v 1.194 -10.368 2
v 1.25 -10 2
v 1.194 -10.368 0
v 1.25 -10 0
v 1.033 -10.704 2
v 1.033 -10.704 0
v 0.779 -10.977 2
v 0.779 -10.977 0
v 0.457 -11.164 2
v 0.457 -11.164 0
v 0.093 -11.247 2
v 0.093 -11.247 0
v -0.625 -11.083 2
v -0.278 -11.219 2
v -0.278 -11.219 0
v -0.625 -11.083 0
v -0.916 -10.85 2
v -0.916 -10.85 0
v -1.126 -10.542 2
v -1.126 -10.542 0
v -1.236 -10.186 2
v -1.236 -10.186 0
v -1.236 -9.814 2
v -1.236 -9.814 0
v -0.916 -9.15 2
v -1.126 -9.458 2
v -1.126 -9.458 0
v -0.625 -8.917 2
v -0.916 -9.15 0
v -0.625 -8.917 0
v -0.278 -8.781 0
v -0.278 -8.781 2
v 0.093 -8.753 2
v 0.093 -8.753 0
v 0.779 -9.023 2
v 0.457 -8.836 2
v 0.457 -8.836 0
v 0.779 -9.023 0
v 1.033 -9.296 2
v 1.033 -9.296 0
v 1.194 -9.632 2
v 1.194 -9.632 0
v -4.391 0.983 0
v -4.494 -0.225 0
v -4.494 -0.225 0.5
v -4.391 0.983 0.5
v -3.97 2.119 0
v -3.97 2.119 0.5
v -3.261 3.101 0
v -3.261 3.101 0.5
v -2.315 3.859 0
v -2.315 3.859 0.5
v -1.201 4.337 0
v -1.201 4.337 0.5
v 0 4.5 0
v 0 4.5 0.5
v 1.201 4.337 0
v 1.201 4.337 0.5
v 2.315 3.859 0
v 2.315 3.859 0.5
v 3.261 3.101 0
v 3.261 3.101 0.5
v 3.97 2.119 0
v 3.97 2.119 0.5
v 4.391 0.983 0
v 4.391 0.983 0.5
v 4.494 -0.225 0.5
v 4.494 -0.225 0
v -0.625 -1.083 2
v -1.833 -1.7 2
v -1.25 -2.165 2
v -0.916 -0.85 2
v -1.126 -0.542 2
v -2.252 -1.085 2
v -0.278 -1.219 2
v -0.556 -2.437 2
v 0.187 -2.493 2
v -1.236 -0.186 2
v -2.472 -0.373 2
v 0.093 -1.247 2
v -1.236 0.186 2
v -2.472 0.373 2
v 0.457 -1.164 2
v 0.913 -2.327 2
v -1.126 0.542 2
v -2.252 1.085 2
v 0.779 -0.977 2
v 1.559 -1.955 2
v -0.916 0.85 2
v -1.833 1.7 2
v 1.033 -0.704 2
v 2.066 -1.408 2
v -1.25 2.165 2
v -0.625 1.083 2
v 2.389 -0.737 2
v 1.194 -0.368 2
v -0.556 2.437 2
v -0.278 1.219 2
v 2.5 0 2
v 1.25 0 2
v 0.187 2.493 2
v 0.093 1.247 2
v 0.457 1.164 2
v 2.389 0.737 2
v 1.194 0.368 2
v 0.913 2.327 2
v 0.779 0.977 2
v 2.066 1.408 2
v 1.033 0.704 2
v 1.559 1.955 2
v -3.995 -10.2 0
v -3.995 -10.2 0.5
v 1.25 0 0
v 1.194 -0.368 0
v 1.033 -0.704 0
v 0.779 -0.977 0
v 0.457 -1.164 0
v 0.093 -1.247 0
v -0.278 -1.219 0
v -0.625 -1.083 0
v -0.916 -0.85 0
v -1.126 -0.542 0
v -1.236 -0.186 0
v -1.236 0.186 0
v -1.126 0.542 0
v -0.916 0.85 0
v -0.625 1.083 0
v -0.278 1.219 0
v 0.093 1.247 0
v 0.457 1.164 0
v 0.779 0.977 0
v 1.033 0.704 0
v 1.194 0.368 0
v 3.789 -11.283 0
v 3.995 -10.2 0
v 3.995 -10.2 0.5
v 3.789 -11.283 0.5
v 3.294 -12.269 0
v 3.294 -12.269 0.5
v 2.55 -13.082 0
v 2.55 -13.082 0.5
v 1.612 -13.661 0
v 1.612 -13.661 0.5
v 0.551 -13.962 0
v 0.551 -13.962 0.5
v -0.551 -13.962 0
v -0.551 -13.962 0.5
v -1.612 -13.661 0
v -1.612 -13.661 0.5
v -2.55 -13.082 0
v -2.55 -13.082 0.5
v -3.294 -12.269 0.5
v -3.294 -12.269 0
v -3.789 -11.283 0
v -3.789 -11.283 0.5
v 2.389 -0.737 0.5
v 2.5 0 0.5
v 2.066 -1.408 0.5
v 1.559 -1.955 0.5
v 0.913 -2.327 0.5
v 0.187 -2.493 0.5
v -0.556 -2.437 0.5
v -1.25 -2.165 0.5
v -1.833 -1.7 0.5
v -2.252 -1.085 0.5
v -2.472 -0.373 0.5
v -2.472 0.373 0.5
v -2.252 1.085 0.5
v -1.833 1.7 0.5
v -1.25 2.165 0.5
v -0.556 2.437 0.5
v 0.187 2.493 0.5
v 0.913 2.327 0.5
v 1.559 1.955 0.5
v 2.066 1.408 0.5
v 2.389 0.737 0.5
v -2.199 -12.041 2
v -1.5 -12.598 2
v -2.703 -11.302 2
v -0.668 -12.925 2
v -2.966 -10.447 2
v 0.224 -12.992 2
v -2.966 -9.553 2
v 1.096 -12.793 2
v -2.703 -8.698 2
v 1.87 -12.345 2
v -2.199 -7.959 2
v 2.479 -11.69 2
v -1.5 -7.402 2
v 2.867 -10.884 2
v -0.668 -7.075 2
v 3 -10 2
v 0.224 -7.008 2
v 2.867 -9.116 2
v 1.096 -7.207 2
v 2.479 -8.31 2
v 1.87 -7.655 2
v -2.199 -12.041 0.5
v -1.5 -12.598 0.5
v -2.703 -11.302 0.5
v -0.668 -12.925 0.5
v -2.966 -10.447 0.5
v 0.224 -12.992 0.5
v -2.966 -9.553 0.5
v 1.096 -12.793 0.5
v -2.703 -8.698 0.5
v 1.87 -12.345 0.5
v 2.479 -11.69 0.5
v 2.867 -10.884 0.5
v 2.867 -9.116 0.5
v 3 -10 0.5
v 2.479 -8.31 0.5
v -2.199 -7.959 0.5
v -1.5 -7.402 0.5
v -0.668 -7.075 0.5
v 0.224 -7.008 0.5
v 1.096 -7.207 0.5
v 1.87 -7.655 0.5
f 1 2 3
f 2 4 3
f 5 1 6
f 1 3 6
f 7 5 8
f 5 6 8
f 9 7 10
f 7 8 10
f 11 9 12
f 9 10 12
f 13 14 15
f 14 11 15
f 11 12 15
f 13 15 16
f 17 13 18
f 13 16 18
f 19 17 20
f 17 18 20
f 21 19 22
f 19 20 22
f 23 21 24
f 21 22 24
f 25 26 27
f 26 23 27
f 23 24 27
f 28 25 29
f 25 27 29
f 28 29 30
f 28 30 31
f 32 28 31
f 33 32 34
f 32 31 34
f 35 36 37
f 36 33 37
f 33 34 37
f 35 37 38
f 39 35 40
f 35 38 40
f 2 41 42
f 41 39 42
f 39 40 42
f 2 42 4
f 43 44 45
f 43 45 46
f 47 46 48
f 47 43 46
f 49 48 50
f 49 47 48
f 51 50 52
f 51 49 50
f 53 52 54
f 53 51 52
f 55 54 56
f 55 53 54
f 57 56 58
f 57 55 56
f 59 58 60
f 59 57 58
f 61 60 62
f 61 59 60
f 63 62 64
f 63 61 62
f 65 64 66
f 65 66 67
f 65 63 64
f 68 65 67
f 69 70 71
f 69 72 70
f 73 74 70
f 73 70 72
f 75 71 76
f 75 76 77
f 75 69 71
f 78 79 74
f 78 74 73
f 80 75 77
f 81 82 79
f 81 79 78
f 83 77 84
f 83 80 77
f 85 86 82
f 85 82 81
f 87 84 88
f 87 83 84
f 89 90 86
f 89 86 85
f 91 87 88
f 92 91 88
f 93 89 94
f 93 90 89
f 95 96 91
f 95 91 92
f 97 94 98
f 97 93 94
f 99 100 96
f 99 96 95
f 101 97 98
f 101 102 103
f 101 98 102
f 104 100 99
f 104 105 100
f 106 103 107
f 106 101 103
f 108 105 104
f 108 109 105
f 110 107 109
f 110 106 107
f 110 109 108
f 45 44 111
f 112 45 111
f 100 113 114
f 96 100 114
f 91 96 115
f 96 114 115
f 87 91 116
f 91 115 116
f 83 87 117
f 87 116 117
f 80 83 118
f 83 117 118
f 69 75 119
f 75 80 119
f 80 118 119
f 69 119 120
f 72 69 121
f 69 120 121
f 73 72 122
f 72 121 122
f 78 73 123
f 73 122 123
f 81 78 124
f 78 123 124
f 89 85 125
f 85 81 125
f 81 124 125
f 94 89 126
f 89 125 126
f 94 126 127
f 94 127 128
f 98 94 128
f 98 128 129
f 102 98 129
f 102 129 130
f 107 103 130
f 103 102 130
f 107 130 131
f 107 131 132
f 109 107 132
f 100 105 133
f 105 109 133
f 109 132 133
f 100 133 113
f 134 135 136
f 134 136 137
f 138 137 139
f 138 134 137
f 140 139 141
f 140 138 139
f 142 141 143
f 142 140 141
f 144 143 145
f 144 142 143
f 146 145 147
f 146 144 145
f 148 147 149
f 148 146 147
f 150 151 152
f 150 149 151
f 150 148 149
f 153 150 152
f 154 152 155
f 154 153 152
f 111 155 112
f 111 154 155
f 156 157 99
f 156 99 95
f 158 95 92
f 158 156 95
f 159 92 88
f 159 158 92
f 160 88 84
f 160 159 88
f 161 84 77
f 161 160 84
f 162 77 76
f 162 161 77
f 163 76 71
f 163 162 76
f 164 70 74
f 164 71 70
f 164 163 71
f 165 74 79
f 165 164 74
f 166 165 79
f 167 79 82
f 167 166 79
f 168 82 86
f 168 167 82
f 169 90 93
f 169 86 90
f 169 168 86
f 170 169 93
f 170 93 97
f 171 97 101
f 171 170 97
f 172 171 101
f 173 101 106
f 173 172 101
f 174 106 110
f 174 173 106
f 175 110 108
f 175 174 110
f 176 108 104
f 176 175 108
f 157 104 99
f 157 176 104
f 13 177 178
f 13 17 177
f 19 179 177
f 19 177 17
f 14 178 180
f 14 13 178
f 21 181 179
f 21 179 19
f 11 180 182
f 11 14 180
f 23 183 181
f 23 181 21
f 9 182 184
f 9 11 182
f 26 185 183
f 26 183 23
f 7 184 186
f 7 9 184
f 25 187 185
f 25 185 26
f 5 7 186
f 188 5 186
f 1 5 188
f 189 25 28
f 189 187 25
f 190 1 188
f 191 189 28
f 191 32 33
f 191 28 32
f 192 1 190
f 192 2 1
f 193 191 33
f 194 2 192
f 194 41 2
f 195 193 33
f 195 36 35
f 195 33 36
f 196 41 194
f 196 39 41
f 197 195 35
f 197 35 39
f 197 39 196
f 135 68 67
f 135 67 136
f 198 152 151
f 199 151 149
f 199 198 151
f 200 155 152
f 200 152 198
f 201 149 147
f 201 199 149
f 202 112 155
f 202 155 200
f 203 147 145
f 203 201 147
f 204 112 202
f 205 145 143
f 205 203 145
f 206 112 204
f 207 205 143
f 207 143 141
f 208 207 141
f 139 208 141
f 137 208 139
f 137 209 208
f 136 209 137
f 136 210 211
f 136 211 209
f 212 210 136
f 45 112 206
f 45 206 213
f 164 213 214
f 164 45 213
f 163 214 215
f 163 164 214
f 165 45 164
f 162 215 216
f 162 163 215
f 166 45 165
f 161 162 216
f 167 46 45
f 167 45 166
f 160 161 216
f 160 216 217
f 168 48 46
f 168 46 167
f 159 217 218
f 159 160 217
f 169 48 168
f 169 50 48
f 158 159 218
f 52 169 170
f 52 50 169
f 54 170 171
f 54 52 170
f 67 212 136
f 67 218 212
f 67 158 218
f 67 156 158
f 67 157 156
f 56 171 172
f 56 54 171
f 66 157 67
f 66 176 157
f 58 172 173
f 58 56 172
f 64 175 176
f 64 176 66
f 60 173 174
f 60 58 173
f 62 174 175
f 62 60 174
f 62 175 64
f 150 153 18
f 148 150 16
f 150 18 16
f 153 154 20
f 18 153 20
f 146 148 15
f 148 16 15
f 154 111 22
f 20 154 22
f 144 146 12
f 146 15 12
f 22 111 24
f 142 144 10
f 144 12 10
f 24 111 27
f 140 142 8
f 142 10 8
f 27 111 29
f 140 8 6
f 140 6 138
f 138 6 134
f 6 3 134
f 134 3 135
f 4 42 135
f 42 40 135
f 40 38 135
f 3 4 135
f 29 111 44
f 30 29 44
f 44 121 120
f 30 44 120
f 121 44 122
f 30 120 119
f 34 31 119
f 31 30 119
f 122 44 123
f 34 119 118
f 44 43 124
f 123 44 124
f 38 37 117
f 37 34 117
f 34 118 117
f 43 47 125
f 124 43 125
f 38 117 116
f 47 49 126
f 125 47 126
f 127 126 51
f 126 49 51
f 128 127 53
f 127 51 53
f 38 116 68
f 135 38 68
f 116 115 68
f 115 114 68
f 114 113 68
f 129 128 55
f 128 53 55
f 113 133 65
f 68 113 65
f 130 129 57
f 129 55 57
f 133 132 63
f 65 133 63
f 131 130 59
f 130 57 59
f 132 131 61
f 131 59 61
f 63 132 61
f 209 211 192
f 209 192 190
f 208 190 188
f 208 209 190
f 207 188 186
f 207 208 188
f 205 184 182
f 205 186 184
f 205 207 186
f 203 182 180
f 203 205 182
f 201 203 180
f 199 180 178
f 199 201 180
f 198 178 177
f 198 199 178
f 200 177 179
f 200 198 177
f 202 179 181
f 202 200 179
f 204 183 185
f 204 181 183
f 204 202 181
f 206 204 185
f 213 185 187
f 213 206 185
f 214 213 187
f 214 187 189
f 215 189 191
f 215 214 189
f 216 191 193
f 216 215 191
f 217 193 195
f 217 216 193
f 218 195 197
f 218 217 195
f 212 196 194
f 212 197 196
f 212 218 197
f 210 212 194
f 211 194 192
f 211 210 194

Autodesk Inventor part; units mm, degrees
ref_plane "YZ Plane" through (0, 0, 0) normal (1, 0, 0) x (0, 1, 0)
ref_plane "XZ Plane" through (0, 0, 0) normal (0, 1, 0) x (-1, 0, 0)
ref_plane "XY Plane" through (0, 0, 0) normal (0, 0, 1) x (1, 0, 0)
sketch "Sketch1" plane through (0, 0, 0) normal (0, 0, 1) x (1, 0, 0)
  circle A0 centre (0, 0) radius 2.5
  circle A1 centre (0, 0) radius 4.5
  circle A2 centre (0, -10) radius 1.25
  circle A3 centre (0, -10) radius 3
  circle A4 centre (0, -10) radius 4
  circle A5 centre (0, 0) radius 1.25
  line L0 (-4.4944, -0.225) -> (-3.995, -10.2)
  line L1 (4.4944, -0.225) -> (3.995, -10.2)
  line L2 (0, 0) -> (0, -19.0302) construction
  point P0 (66.1895, -52.0583)
  point P1 (148.6808, -39.1685)
  point P2 (99.1548, -7.9801)
  point P3 (101.772, -8.3287)
  point P4 (96.5376, -8.3287)
  dimension "d8" = 9
  dimension "d13" = 5
  dimension "d25" = 2.5
  dimension "d26" = 6
  dimension "d27" = 8
  dimension "d28" = 2.5
  dimension "d29" = 10
extrude "Extrusion1" add sketch "Sketch1" along normal blind 0.5 contours A1 | A1 L1 A4 L0 | A4
extrude "Extrusion2" add sketch "Sketch1" along normal blind 2 contours A0 | A3
properties part number "ヘッケン抑え" material "アルミニウム 2014-T6"
